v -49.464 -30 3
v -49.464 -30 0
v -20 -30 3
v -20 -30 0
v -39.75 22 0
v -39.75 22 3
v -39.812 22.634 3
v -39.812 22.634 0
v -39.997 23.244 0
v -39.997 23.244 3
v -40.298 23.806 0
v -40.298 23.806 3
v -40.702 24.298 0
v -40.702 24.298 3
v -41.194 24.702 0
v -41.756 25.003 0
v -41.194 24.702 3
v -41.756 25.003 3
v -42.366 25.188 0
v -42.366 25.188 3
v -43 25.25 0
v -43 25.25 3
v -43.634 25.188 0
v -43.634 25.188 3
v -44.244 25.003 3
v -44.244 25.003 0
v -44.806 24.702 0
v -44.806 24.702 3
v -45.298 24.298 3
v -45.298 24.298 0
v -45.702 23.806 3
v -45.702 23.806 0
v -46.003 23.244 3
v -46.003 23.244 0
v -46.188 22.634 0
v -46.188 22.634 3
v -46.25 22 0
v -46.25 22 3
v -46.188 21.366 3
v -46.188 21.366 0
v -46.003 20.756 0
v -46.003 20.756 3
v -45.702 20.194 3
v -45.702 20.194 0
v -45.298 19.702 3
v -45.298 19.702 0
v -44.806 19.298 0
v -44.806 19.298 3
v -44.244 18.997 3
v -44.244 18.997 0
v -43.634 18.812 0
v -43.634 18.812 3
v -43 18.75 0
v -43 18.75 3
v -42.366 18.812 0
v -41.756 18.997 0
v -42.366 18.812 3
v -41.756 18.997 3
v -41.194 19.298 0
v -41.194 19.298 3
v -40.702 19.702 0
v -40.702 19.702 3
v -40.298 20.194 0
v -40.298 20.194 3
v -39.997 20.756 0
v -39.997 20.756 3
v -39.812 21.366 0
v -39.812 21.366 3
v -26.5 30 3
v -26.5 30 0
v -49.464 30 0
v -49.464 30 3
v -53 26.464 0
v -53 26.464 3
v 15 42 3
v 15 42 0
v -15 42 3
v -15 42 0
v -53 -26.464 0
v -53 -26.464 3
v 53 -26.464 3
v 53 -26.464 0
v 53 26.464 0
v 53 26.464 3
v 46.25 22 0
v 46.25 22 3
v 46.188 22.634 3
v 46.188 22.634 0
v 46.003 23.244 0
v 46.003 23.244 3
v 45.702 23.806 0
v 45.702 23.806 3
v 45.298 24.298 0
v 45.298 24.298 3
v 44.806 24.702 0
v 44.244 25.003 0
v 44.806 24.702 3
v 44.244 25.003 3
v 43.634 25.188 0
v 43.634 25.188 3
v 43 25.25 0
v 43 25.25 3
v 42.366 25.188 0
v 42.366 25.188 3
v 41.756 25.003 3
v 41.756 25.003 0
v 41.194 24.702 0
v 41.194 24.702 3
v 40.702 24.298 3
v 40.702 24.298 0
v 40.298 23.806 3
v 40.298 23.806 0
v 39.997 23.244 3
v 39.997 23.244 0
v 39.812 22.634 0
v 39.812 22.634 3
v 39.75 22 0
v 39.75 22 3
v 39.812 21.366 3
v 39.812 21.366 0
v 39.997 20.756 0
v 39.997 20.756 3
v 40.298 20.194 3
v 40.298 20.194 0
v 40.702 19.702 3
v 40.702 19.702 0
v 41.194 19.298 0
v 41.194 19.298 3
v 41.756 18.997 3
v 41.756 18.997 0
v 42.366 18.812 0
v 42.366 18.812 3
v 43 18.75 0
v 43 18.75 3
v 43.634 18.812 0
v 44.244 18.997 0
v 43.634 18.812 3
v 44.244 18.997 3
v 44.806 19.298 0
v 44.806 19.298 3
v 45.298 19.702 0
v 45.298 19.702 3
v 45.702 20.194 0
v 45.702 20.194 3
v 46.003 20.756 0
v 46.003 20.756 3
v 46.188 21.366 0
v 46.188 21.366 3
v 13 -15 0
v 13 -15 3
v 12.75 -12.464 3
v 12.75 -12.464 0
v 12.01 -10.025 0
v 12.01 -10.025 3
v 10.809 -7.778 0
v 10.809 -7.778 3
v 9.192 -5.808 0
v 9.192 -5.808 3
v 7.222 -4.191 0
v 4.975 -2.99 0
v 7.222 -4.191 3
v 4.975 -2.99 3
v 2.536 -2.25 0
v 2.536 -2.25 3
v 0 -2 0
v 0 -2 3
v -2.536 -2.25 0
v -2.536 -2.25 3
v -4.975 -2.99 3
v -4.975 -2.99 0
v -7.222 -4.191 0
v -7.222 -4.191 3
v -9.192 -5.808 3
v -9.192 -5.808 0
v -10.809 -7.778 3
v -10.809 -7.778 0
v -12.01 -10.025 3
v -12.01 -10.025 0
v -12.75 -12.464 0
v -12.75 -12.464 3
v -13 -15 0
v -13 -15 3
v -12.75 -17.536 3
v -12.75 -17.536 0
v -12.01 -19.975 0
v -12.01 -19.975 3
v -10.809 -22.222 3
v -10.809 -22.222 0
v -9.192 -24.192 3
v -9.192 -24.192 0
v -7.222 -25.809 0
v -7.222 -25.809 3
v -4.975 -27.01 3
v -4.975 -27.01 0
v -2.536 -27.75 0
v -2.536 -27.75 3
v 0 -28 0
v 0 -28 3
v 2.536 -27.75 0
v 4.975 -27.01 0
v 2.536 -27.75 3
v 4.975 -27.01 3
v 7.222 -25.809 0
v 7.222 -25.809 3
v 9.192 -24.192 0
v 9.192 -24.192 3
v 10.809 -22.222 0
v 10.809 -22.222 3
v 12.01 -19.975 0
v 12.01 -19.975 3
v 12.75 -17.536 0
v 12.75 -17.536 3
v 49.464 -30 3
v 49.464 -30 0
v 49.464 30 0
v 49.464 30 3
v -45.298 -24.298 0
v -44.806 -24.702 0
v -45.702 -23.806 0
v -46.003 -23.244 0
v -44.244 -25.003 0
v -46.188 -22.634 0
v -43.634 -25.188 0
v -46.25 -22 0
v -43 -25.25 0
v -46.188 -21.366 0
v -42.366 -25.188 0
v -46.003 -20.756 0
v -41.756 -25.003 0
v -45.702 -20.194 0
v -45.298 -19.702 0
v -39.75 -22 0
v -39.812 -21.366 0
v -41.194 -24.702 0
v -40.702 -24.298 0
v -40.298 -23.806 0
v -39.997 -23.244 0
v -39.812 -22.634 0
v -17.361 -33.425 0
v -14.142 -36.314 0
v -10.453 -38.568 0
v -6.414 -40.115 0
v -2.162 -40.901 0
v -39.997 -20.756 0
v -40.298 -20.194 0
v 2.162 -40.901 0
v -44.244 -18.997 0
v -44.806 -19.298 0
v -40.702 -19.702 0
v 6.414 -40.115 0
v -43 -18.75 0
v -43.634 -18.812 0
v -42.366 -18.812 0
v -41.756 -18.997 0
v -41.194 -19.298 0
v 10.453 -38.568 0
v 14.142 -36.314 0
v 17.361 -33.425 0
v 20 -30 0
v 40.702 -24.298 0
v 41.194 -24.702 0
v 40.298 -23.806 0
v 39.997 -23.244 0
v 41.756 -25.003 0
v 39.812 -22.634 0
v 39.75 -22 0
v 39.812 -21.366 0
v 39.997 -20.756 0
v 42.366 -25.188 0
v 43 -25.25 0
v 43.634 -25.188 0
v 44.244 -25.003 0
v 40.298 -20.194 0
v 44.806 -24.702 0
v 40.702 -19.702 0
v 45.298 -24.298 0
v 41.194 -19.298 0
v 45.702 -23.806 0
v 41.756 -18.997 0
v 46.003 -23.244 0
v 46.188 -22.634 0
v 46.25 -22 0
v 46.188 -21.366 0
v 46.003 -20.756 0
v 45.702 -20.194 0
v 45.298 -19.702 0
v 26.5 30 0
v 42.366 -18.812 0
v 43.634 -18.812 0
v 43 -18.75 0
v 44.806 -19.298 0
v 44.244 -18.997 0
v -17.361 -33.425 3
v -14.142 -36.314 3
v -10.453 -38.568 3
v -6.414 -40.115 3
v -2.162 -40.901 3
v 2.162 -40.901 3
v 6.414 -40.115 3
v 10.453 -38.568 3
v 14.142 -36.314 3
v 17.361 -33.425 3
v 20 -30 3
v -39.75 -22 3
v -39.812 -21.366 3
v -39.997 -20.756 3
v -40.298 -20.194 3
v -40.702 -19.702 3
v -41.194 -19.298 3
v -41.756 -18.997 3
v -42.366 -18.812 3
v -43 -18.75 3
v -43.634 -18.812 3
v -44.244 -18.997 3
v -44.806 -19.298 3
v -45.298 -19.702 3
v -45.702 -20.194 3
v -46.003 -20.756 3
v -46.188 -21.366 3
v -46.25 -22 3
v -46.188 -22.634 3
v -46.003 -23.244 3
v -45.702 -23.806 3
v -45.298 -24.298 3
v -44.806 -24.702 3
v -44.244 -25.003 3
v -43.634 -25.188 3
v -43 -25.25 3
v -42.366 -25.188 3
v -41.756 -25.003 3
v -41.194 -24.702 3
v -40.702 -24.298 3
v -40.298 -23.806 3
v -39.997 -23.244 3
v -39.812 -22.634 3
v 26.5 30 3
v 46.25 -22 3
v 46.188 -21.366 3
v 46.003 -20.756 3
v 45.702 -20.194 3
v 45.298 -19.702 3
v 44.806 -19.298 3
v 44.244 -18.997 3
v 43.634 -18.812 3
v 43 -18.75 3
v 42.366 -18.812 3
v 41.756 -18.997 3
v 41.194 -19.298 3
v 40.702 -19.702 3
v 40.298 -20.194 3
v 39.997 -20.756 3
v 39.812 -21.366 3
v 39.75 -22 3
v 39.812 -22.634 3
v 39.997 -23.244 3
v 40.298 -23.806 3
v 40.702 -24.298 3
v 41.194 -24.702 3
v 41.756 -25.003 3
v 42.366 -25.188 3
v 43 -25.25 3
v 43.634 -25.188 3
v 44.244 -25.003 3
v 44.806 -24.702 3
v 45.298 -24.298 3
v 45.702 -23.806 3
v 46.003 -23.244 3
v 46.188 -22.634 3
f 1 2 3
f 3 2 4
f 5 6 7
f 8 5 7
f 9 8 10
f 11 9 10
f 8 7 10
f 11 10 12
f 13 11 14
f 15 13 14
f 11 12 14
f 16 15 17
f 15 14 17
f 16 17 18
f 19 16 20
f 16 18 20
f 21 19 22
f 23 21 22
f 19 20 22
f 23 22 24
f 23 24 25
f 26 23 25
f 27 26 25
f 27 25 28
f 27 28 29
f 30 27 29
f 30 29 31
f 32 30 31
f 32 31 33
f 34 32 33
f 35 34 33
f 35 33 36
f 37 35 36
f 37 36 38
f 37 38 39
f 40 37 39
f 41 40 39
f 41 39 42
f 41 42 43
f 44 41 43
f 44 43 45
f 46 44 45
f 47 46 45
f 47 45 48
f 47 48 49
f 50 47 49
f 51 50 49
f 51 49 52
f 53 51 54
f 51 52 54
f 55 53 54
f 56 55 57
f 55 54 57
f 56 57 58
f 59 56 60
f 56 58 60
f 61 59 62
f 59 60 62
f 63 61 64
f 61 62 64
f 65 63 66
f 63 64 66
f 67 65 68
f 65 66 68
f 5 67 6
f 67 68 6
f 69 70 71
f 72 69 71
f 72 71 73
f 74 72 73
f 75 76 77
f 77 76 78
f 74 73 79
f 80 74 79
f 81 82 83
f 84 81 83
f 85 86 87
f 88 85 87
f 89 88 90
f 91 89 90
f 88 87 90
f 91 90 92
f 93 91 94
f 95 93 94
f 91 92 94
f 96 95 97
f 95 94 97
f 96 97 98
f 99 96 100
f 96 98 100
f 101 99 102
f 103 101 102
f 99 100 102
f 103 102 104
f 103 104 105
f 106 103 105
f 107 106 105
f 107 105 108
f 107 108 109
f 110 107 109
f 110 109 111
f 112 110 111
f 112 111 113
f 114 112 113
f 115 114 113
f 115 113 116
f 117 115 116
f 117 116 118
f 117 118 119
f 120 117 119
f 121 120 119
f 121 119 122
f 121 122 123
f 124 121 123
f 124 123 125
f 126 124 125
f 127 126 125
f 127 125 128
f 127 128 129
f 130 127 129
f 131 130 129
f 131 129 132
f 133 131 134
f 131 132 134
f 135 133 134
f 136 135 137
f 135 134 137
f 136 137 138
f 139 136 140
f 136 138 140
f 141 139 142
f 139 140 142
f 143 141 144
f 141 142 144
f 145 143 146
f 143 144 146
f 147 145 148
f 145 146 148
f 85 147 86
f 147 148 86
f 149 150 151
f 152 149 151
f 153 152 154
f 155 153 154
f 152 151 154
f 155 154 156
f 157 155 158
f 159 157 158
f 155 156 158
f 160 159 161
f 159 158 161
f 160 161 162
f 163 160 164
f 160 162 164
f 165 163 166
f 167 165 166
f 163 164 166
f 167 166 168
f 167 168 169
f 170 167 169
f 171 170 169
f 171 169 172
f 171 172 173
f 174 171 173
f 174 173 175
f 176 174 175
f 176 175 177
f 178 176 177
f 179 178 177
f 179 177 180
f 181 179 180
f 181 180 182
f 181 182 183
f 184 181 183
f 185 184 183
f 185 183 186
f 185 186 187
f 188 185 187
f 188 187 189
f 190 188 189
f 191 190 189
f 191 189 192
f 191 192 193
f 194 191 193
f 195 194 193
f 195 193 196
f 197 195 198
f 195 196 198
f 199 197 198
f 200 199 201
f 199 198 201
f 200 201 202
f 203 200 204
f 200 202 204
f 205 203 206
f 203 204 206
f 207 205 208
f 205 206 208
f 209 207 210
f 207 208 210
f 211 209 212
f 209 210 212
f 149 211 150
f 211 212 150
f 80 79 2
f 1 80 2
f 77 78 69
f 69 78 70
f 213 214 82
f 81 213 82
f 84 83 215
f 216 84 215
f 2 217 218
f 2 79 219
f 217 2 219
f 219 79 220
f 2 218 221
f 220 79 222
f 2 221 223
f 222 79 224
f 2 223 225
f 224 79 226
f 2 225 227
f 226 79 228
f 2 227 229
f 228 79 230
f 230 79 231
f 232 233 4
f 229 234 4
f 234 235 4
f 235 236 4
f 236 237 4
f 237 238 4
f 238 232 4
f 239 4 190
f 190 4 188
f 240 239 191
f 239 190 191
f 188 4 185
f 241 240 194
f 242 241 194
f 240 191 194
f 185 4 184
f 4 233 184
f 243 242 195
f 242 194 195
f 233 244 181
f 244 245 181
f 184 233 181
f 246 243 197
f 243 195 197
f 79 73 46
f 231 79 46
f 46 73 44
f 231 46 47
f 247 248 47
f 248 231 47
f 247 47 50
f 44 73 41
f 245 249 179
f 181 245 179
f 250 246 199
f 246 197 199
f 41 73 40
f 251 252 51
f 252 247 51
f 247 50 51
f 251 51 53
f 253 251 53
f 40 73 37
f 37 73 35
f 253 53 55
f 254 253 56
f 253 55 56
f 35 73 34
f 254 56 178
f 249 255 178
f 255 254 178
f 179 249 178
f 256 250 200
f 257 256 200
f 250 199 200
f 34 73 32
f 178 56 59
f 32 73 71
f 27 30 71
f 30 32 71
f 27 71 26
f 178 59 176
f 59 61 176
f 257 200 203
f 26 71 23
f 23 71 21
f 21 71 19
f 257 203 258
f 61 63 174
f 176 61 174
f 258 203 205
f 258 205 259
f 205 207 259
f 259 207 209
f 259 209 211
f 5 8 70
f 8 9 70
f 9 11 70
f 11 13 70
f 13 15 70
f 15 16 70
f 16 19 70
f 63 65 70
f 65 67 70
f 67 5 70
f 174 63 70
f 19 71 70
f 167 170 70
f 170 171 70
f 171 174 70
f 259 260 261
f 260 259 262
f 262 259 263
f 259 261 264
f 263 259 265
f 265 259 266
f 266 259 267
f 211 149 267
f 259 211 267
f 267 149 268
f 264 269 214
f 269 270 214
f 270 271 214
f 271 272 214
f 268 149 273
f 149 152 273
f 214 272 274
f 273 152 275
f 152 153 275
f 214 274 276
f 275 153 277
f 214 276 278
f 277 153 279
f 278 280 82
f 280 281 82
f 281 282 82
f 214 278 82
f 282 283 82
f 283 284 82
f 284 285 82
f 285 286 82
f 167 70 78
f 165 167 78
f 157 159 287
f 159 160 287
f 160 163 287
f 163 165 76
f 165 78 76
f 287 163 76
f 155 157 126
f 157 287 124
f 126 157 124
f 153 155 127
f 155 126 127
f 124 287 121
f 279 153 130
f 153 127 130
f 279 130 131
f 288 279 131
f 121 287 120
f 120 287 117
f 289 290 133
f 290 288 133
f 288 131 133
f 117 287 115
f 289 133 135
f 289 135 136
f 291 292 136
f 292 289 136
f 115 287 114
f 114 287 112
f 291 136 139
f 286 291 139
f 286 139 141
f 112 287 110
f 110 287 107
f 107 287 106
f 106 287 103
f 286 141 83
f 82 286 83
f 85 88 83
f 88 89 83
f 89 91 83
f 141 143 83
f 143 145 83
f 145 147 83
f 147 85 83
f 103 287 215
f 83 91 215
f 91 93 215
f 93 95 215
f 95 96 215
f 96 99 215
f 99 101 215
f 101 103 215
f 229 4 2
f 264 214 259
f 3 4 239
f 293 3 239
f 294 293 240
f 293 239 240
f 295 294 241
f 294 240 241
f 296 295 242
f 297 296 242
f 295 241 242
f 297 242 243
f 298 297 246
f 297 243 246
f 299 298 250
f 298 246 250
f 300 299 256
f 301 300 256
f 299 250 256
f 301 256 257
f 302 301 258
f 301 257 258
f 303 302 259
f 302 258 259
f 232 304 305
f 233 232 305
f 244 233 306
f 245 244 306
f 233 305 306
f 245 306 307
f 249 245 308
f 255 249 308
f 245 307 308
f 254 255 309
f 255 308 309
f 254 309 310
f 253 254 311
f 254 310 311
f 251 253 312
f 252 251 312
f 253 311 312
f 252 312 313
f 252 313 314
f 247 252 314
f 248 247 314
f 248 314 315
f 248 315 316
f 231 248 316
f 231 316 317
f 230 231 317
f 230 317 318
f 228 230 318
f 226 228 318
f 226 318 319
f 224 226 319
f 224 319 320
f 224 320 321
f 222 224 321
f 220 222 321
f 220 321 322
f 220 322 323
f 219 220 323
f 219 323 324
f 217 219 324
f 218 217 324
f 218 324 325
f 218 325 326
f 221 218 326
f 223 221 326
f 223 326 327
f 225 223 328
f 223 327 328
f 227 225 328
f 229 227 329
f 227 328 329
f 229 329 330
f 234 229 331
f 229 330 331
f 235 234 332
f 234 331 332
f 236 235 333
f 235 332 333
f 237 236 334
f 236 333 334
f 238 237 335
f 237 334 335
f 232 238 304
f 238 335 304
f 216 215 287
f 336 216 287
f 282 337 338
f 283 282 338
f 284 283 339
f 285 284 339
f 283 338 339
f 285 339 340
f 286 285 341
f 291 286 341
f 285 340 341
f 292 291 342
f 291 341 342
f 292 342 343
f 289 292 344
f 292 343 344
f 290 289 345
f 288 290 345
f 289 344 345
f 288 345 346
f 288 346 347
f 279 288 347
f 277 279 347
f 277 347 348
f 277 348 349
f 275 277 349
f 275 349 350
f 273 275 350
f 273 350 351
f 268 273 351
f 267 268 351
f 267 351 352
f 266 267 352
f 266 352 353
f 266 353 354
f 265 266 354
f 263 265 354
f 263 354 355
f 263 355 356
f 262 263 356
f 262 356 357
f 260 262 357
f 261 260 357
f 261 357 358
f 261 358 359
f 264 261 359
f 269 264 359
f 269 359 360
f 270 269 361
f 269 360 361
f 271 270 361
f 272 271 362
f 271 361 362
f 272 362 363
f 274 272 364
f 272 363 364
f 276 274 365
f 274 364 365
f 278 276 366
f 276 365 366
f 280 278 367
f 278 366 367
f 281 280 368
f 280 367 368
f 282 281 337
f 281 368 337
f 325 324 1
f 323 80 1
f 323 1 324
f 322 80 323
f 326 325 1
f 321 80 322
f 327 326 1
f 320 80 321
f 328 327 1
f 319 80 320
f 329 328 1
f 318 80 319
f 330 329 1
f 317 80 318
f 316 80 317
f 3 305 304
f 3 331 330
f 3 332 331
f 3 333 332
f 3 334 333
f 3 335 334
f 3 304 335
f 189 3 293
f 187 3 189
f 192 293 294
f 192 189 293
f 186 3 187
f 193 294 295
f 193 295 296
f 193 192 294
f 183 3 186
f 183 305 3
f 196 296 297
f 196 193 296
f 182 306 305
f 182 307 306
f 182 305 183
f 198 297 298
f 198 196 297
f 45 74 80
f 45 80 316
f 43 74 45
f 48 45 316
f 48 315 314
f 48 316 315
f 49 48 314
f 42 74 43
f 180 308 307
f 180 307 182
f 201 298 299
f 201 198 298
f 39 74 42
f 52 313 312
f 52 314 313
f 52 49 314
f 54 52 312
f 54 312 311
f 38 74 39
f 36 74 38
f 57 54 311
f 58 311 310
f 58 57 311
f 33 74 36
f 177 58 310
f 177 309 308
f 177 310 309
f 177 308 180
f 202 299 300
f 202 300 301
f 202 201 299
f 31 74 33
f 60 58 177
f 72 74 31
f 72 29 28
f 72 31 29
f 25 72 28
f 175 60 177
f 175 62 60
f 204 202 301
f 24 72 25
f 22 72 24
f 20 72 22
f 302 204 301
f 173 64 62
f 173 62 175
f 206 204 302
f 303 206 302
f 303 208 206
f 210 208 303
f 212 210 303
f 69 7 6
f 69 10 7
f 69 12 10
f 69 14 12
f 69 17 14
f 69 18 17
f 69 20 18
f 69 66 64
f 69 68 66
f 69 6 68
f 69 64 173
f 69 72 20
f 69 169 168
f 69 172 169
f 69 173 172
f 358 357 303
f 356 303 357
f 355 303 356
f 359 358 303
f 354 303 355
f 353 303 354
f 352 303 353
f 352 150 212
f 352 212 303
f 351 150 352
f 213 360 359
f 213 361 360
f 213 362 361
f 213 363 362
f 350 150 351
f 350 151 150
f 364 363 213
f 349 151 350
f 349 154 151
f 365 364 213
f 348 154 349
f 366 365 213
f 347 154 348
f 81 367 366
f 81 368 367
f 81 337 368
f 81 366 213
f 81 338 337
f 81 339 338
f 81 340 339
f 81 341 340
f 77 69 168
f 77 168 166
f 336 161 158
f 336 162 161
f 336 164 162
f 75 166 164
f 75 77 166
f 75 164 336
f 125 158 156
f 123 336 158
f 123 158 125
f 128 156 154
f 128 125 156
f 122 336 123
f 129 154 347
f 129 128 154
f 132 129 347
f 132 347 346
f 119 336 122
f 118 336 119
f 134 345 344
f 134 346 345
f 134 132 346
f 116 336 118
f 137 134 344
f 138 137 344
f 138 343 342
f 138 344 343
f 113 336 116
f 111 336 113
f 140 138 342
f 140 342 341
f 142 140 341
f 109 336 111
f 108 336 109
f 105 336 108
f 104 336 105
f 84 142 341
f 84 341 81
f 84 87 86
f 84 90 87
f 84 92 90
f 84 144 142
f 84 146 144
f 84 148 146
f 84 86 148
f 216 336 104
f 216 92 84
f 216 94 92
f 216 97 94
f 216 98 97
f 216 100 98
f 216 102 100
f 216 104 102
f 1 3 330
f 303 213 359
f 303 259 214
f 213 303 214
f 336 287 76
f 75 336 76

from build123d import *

# Parameters (mm, degrees)
F1_DEPTH = 3
F2_R     = 13
F3_DEPTH = 3.001
F4_R     = 3.25
F5_DEPTH = 3.001


with BuildPart() as f1:
    # F0 (on Top) → F1 (new body)
    with BuildSketch(Plane.XY):
        with BuildLine():
            Line((-26.5, 30), (-49.464466, 30))
            Line((-49.464466, 30), (-53, 26.464466))
            Line((-53, 26.464466), (-53, -26.464466))
            Line((-53, -26.464466), (-49.464466, -30))
            Line((-49.464466, -30), (-20, -30))
            ThreePointArc((-20, -30), (0, -41), (20, -30))
            Line((20, -30), (49.464466, -30))
            Line((49.464466, -30), (53, -26.464466))
            Line((53, -26.464466), (53, 26.464466))
            Line((53, 26.464466), (49.464466, 30))
            Line((49.464466, 30), (26.5, 30))
            Line((26.5, 30), (15, 42))
            Line((15, 42), (-15, 42))
            Line((-15, 42), (-26.5, 30))
        make_face()
    extrude(amount=F1_DEPTH)

    # F2 (on face) → F3 (cut, through all)
    with BuildSketch(Plane.XY.offset(3)):
        with Locations((0, -15)):
            Circle(F2_R)
    extrude(amount=-F3_DEPTH, mode=Mode.SUBTRACT)

    # F4 (on face) → F5 (cut, through all)
    with BuildSketch(Plane.XY.offset(3)):
        with Locations((-43, 22)):
            Circle(F4_R)
        with Locations((-43, -22)):
            Circle(F4_R)
        with Locations((43, 22)):
            Circle(F4_R)
        with Locations((43, -22)):
            Circle(F4_R)
    extrude(amount=-F5_DEPTH, mode=Mode.SUBTRACT)


solid = f1.part
